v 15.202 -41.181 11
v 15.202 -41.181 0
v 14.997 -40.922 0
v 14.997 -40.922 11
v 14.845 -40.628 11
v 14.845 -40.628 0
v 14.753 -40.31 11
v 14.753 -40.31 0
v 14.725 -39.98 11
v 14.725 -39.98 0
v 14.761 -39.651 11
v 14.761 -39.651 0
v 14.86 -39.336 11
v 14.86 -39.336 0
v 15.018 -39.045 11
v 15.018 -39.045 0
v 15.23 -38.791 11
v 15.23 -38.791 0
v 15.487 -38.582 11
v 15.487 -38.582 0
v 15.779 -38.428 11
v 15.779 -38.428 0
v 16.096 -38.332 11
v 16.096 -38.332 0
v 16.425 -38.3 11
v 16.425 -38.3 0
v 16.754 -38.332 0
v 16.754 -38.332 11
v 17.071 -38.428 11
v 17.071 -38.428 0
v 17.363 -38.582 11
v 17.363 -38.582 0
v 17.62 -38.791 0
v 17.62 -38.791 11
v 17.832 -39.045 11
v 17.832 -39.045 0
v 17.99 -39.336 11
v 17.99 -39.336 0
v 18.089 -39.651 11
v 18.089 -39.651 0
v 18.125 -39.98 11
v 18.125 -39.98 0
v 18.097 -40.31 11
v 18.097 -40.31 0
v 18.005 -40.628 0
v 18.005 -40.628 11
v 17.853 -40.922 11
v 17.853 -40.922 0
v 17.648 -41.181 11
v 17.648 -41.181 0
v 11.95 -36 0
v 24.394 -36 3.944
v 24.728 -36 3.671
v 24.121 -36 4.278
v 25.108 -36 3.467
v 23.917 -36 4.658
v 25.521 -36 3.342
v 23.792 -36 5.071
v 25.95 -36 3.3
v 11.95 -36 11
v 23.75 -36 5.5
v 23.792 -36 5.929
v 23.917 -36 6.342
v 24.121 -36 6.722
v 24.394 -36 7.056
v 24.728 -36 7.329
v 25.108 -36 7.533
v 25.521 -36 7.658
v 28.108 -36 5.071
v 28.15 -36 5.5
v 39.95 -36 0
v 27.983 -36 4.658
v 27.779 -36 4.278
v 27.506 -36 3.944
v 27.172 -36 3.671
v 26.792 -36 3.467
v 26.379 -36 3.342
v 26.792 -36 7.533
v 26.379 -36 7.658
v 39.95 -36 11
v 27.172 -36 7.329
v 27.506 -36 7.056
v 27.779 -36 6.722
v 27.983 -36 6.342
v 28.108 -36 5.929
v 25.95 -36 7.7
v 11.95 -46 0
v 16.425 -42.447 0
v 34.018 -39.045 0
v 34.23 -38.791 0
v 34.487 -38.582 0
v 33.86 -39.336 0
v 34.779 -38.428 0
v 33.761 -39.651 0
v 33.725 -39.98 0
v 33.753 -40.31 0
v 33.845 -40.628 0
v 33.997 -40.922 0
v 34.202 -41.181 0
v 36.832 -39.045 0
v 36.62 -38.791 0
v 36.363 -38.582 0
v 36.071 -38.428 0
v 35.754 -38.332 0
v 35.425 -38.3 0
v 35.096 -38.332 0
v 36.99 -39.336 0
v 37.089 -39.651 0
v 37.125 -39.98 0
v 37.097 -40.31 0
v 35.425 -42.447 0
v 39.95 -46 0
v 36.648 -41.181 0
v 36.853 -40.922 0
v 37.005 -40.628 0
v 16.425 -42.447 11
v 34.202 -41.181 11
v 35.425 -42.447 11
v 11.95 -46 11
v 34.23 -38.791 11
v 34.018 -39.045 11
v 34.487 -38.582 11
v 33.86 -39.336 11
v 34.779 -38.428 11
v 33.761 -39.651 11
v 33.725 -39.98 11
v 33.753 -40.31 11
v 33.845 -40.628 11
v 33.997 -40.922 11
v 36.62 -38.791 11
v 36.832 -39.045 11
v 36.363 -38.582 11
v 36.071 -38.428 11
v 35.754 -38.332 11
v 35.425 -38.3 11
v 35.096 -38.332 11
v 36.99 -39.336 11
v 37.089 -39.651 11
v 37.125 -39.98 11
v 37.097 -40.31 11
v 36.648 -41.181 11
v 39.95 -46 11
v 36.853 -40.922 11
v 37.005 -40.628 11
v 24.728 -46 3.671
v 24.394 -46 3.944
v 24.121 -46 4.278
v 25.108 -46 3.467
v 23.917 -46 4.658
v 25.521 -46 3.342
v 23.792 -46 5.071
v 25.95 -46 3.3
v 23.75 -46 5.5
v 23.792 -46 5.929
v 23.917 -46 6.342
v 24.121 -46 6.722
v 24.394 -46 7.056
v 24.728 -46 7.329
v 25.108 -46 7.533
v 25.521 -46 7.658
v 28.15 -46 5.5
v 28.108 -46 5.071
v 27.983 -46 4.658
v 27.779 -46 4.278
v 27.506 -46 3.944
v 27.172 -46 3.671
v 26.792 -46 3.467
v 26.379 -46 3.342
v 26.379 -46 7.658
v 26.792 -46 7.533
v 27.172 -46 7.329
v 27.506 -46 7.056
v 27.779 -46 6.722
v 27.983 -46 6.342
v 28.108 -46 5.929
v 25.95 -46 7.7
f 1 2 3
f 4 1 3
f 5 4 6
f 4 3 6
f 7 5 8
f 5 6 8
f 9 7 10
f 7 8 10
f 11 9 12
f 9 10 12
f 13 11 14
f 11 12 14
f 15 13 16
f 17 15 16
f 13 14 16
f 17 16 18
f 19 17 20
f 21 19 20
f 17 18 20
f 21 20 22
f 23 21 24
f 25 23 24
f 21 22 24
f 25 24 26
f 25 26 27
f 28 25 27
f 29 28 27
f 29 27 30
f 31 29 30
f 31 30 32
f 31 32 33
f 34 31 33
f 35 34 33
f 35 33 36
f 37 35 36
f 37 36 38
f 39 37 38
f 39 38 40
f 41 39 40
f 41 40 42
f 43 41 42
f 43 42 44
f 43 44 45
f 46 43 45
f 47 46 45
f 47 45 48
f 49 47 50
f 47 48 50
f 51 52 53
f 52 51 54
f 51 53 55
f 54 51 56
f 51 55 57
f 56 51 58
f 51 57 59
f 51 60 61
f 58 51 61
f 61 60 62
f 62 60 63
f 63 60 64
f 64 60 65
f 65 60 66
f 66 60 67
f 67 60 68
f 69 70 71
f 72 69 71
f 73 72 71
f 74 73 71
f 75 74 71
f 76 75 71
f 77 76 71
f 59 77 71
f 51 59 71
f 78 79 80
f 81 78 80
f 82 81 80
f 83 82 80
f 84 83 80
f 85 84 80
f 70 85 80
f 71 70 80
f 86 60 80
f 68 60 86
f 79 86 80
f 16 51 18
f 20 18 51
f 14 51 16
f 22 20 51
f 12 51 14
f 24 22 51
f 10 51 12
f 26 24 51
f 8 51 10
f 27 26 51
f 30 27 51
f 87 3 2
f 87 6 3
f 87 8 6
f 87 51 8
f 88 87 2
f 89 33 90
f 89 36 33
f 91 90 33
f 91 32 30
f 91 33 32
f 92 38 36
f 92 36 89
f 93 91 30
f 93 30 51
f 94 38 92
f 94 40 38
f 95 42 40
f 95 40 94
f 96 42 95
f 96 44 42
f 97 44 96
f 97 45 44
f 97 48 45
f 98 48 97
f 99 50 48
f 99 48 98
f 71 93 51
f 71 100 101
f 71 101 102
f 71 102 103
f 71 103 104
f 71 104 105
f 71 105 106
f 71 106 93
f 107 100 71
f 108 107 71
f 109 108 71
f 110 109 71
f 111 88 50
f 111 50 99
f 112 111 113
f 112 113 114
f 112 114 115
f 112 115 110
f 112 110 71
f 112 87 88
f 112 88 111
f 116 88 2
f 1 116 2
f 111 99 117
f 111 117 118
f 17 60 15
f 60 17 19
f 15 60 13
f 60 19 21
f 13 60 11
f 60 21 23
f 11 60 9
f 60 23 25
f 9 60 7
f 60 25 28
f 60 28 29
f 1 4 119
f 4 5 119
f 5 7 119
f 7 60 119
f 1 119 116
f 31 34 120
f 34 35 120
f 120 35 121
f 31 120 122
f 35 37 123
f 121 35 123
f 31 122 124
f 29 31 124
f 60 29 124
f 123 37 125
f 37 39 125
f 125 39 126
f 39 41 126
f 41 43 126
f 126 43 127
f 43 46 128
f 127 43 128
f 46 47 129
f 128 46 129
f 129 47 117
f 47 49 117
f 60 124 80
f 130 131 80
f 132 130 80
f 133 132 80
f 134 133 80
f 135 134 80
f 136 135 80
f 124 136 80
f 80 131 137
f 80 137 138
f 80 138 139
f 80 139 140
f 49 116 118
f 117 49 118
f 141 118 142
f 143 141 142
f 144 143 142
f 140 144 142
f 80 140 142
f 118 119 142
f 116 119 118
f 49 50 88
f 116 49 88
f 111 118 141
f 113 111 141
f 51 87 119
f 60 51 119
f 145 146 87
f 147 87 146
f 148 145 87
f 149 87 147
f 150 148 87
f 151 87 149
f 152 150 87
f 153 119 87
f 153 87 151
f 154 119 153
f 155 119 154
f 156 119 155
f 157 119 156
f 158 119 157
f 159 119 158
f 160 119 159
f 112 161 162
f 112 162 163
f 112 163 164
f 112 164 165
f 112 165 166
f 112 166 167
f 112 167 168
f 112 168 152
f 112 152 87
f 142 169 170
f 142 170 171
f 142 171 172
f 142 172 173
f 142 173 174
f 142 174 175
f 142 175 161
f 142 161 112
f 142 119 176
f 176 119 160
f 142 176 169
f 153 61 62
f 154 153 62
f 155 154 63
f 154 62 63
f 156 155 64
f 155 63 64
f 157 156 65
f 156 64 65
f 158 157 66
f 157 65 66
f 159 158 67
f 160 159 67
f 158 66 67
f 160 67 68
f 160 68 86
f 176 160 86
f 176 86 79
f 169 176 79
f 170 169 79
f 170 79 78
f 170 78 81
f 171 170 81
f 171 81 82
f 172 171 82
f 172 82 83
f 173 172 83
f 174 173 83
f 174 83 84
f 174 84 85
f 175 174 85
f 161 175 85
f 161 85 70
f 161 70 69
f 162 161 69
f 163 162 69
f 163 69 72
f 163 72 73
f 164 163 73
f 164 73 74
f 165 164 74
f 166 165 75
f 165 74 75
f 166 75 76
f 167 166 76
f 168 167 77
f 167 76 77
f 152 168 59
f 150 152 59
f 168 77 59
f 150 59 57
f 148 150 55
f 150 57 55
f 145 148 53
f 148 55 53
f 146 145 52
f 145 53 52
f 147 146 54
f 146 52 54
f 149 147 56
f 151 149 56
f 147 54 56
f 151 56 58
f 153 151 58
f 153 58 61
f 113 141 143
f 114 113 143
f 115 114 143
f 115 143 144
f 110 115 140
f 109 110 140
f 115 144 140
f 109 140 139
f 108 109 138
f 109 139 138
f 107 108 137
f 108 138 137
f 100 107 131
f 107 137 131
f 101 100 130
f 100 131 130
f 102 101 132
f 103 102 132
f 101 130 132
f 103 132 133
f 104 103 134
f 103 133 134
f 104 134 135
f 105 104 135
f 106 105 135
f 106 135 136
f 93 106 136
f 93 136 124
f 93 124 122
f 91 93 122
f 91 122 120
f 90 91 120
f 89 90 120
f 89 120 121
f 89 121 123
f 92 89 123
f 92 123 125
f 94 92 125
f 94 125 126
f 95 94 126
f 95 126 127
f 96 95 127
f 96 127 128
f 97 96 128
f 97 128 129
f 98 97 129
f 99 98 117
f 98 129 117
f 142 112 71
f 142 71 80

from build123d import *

# Parameters (mm, degrees)
SKETCH1_W           = 28
SKETCH1_H           = 11
BOSS_EXTRUDE1_DEPTH = 10
CUT_EXTRUDE1_DEPTH  = 62.911246959
CUT_EXTRUDE2_DEPTH  = 62.911246959
HOLE1_D             = 4.4


with BuildPart() as part:
    # Sketch1 → Boss-Extrude1 (new body)
    with BuildSketch(Plane.XZ.offset(46)):
        with Locations((25.95, 5.5)):
            Rectangle(SKETCH1_W, SKETCH1_H)
    extrude(amount=-BOSS_EXTRUDE1_DEPTH)

    # Sketch2 → Cut-Extrude1 (cut, through all)
    with BuildSketch(Plane.XY.offset(11)):
        with BuildLine():
            Line((35.425, -42.447246117), (36.647877661, -41.18091923))
            ThreePointArc((36.647877661, -41.18091923), (35.425, -38.3), (34.202122339, -41.18091923))
            Line((34.202122339, -41.18091923), (35.425, -42.447246117))
        make_face()
    extrude(amount=-CUT_EXTRUDE1_DEPTH, mode=Mode.SUBTRACT)

    # Sketch3 → Cut-Extrude2 (cut, through all)
    with BuildSketch(Plane(origin=(0, 0, 0), x_dir=(-1, 0, 0), z_dir=(0, 0, -1))):
        with BuildLine():
            Line((-17.647877661, -41.18091923), (-16.425, -42.447246117))
            Line((-16.425, -42.447246117), (-15.202122339, -41.18091923))
            ThreePointArc((-15.202122339, -41.18091923), (-16.425, -38.3), (-17.647877661, -41.18091923))
        make_face()
    extrude(amount=-CUT_EXTRUDE2_DEPTH, mode=Mode.SUBTRACT)

    # Hole1 (through all)
    with Locations(Plane.XZ.offset(46)):
        with Locations((25.95, 5.5)):
            Hole(HOLE1_D / 2)


solid = part.part
